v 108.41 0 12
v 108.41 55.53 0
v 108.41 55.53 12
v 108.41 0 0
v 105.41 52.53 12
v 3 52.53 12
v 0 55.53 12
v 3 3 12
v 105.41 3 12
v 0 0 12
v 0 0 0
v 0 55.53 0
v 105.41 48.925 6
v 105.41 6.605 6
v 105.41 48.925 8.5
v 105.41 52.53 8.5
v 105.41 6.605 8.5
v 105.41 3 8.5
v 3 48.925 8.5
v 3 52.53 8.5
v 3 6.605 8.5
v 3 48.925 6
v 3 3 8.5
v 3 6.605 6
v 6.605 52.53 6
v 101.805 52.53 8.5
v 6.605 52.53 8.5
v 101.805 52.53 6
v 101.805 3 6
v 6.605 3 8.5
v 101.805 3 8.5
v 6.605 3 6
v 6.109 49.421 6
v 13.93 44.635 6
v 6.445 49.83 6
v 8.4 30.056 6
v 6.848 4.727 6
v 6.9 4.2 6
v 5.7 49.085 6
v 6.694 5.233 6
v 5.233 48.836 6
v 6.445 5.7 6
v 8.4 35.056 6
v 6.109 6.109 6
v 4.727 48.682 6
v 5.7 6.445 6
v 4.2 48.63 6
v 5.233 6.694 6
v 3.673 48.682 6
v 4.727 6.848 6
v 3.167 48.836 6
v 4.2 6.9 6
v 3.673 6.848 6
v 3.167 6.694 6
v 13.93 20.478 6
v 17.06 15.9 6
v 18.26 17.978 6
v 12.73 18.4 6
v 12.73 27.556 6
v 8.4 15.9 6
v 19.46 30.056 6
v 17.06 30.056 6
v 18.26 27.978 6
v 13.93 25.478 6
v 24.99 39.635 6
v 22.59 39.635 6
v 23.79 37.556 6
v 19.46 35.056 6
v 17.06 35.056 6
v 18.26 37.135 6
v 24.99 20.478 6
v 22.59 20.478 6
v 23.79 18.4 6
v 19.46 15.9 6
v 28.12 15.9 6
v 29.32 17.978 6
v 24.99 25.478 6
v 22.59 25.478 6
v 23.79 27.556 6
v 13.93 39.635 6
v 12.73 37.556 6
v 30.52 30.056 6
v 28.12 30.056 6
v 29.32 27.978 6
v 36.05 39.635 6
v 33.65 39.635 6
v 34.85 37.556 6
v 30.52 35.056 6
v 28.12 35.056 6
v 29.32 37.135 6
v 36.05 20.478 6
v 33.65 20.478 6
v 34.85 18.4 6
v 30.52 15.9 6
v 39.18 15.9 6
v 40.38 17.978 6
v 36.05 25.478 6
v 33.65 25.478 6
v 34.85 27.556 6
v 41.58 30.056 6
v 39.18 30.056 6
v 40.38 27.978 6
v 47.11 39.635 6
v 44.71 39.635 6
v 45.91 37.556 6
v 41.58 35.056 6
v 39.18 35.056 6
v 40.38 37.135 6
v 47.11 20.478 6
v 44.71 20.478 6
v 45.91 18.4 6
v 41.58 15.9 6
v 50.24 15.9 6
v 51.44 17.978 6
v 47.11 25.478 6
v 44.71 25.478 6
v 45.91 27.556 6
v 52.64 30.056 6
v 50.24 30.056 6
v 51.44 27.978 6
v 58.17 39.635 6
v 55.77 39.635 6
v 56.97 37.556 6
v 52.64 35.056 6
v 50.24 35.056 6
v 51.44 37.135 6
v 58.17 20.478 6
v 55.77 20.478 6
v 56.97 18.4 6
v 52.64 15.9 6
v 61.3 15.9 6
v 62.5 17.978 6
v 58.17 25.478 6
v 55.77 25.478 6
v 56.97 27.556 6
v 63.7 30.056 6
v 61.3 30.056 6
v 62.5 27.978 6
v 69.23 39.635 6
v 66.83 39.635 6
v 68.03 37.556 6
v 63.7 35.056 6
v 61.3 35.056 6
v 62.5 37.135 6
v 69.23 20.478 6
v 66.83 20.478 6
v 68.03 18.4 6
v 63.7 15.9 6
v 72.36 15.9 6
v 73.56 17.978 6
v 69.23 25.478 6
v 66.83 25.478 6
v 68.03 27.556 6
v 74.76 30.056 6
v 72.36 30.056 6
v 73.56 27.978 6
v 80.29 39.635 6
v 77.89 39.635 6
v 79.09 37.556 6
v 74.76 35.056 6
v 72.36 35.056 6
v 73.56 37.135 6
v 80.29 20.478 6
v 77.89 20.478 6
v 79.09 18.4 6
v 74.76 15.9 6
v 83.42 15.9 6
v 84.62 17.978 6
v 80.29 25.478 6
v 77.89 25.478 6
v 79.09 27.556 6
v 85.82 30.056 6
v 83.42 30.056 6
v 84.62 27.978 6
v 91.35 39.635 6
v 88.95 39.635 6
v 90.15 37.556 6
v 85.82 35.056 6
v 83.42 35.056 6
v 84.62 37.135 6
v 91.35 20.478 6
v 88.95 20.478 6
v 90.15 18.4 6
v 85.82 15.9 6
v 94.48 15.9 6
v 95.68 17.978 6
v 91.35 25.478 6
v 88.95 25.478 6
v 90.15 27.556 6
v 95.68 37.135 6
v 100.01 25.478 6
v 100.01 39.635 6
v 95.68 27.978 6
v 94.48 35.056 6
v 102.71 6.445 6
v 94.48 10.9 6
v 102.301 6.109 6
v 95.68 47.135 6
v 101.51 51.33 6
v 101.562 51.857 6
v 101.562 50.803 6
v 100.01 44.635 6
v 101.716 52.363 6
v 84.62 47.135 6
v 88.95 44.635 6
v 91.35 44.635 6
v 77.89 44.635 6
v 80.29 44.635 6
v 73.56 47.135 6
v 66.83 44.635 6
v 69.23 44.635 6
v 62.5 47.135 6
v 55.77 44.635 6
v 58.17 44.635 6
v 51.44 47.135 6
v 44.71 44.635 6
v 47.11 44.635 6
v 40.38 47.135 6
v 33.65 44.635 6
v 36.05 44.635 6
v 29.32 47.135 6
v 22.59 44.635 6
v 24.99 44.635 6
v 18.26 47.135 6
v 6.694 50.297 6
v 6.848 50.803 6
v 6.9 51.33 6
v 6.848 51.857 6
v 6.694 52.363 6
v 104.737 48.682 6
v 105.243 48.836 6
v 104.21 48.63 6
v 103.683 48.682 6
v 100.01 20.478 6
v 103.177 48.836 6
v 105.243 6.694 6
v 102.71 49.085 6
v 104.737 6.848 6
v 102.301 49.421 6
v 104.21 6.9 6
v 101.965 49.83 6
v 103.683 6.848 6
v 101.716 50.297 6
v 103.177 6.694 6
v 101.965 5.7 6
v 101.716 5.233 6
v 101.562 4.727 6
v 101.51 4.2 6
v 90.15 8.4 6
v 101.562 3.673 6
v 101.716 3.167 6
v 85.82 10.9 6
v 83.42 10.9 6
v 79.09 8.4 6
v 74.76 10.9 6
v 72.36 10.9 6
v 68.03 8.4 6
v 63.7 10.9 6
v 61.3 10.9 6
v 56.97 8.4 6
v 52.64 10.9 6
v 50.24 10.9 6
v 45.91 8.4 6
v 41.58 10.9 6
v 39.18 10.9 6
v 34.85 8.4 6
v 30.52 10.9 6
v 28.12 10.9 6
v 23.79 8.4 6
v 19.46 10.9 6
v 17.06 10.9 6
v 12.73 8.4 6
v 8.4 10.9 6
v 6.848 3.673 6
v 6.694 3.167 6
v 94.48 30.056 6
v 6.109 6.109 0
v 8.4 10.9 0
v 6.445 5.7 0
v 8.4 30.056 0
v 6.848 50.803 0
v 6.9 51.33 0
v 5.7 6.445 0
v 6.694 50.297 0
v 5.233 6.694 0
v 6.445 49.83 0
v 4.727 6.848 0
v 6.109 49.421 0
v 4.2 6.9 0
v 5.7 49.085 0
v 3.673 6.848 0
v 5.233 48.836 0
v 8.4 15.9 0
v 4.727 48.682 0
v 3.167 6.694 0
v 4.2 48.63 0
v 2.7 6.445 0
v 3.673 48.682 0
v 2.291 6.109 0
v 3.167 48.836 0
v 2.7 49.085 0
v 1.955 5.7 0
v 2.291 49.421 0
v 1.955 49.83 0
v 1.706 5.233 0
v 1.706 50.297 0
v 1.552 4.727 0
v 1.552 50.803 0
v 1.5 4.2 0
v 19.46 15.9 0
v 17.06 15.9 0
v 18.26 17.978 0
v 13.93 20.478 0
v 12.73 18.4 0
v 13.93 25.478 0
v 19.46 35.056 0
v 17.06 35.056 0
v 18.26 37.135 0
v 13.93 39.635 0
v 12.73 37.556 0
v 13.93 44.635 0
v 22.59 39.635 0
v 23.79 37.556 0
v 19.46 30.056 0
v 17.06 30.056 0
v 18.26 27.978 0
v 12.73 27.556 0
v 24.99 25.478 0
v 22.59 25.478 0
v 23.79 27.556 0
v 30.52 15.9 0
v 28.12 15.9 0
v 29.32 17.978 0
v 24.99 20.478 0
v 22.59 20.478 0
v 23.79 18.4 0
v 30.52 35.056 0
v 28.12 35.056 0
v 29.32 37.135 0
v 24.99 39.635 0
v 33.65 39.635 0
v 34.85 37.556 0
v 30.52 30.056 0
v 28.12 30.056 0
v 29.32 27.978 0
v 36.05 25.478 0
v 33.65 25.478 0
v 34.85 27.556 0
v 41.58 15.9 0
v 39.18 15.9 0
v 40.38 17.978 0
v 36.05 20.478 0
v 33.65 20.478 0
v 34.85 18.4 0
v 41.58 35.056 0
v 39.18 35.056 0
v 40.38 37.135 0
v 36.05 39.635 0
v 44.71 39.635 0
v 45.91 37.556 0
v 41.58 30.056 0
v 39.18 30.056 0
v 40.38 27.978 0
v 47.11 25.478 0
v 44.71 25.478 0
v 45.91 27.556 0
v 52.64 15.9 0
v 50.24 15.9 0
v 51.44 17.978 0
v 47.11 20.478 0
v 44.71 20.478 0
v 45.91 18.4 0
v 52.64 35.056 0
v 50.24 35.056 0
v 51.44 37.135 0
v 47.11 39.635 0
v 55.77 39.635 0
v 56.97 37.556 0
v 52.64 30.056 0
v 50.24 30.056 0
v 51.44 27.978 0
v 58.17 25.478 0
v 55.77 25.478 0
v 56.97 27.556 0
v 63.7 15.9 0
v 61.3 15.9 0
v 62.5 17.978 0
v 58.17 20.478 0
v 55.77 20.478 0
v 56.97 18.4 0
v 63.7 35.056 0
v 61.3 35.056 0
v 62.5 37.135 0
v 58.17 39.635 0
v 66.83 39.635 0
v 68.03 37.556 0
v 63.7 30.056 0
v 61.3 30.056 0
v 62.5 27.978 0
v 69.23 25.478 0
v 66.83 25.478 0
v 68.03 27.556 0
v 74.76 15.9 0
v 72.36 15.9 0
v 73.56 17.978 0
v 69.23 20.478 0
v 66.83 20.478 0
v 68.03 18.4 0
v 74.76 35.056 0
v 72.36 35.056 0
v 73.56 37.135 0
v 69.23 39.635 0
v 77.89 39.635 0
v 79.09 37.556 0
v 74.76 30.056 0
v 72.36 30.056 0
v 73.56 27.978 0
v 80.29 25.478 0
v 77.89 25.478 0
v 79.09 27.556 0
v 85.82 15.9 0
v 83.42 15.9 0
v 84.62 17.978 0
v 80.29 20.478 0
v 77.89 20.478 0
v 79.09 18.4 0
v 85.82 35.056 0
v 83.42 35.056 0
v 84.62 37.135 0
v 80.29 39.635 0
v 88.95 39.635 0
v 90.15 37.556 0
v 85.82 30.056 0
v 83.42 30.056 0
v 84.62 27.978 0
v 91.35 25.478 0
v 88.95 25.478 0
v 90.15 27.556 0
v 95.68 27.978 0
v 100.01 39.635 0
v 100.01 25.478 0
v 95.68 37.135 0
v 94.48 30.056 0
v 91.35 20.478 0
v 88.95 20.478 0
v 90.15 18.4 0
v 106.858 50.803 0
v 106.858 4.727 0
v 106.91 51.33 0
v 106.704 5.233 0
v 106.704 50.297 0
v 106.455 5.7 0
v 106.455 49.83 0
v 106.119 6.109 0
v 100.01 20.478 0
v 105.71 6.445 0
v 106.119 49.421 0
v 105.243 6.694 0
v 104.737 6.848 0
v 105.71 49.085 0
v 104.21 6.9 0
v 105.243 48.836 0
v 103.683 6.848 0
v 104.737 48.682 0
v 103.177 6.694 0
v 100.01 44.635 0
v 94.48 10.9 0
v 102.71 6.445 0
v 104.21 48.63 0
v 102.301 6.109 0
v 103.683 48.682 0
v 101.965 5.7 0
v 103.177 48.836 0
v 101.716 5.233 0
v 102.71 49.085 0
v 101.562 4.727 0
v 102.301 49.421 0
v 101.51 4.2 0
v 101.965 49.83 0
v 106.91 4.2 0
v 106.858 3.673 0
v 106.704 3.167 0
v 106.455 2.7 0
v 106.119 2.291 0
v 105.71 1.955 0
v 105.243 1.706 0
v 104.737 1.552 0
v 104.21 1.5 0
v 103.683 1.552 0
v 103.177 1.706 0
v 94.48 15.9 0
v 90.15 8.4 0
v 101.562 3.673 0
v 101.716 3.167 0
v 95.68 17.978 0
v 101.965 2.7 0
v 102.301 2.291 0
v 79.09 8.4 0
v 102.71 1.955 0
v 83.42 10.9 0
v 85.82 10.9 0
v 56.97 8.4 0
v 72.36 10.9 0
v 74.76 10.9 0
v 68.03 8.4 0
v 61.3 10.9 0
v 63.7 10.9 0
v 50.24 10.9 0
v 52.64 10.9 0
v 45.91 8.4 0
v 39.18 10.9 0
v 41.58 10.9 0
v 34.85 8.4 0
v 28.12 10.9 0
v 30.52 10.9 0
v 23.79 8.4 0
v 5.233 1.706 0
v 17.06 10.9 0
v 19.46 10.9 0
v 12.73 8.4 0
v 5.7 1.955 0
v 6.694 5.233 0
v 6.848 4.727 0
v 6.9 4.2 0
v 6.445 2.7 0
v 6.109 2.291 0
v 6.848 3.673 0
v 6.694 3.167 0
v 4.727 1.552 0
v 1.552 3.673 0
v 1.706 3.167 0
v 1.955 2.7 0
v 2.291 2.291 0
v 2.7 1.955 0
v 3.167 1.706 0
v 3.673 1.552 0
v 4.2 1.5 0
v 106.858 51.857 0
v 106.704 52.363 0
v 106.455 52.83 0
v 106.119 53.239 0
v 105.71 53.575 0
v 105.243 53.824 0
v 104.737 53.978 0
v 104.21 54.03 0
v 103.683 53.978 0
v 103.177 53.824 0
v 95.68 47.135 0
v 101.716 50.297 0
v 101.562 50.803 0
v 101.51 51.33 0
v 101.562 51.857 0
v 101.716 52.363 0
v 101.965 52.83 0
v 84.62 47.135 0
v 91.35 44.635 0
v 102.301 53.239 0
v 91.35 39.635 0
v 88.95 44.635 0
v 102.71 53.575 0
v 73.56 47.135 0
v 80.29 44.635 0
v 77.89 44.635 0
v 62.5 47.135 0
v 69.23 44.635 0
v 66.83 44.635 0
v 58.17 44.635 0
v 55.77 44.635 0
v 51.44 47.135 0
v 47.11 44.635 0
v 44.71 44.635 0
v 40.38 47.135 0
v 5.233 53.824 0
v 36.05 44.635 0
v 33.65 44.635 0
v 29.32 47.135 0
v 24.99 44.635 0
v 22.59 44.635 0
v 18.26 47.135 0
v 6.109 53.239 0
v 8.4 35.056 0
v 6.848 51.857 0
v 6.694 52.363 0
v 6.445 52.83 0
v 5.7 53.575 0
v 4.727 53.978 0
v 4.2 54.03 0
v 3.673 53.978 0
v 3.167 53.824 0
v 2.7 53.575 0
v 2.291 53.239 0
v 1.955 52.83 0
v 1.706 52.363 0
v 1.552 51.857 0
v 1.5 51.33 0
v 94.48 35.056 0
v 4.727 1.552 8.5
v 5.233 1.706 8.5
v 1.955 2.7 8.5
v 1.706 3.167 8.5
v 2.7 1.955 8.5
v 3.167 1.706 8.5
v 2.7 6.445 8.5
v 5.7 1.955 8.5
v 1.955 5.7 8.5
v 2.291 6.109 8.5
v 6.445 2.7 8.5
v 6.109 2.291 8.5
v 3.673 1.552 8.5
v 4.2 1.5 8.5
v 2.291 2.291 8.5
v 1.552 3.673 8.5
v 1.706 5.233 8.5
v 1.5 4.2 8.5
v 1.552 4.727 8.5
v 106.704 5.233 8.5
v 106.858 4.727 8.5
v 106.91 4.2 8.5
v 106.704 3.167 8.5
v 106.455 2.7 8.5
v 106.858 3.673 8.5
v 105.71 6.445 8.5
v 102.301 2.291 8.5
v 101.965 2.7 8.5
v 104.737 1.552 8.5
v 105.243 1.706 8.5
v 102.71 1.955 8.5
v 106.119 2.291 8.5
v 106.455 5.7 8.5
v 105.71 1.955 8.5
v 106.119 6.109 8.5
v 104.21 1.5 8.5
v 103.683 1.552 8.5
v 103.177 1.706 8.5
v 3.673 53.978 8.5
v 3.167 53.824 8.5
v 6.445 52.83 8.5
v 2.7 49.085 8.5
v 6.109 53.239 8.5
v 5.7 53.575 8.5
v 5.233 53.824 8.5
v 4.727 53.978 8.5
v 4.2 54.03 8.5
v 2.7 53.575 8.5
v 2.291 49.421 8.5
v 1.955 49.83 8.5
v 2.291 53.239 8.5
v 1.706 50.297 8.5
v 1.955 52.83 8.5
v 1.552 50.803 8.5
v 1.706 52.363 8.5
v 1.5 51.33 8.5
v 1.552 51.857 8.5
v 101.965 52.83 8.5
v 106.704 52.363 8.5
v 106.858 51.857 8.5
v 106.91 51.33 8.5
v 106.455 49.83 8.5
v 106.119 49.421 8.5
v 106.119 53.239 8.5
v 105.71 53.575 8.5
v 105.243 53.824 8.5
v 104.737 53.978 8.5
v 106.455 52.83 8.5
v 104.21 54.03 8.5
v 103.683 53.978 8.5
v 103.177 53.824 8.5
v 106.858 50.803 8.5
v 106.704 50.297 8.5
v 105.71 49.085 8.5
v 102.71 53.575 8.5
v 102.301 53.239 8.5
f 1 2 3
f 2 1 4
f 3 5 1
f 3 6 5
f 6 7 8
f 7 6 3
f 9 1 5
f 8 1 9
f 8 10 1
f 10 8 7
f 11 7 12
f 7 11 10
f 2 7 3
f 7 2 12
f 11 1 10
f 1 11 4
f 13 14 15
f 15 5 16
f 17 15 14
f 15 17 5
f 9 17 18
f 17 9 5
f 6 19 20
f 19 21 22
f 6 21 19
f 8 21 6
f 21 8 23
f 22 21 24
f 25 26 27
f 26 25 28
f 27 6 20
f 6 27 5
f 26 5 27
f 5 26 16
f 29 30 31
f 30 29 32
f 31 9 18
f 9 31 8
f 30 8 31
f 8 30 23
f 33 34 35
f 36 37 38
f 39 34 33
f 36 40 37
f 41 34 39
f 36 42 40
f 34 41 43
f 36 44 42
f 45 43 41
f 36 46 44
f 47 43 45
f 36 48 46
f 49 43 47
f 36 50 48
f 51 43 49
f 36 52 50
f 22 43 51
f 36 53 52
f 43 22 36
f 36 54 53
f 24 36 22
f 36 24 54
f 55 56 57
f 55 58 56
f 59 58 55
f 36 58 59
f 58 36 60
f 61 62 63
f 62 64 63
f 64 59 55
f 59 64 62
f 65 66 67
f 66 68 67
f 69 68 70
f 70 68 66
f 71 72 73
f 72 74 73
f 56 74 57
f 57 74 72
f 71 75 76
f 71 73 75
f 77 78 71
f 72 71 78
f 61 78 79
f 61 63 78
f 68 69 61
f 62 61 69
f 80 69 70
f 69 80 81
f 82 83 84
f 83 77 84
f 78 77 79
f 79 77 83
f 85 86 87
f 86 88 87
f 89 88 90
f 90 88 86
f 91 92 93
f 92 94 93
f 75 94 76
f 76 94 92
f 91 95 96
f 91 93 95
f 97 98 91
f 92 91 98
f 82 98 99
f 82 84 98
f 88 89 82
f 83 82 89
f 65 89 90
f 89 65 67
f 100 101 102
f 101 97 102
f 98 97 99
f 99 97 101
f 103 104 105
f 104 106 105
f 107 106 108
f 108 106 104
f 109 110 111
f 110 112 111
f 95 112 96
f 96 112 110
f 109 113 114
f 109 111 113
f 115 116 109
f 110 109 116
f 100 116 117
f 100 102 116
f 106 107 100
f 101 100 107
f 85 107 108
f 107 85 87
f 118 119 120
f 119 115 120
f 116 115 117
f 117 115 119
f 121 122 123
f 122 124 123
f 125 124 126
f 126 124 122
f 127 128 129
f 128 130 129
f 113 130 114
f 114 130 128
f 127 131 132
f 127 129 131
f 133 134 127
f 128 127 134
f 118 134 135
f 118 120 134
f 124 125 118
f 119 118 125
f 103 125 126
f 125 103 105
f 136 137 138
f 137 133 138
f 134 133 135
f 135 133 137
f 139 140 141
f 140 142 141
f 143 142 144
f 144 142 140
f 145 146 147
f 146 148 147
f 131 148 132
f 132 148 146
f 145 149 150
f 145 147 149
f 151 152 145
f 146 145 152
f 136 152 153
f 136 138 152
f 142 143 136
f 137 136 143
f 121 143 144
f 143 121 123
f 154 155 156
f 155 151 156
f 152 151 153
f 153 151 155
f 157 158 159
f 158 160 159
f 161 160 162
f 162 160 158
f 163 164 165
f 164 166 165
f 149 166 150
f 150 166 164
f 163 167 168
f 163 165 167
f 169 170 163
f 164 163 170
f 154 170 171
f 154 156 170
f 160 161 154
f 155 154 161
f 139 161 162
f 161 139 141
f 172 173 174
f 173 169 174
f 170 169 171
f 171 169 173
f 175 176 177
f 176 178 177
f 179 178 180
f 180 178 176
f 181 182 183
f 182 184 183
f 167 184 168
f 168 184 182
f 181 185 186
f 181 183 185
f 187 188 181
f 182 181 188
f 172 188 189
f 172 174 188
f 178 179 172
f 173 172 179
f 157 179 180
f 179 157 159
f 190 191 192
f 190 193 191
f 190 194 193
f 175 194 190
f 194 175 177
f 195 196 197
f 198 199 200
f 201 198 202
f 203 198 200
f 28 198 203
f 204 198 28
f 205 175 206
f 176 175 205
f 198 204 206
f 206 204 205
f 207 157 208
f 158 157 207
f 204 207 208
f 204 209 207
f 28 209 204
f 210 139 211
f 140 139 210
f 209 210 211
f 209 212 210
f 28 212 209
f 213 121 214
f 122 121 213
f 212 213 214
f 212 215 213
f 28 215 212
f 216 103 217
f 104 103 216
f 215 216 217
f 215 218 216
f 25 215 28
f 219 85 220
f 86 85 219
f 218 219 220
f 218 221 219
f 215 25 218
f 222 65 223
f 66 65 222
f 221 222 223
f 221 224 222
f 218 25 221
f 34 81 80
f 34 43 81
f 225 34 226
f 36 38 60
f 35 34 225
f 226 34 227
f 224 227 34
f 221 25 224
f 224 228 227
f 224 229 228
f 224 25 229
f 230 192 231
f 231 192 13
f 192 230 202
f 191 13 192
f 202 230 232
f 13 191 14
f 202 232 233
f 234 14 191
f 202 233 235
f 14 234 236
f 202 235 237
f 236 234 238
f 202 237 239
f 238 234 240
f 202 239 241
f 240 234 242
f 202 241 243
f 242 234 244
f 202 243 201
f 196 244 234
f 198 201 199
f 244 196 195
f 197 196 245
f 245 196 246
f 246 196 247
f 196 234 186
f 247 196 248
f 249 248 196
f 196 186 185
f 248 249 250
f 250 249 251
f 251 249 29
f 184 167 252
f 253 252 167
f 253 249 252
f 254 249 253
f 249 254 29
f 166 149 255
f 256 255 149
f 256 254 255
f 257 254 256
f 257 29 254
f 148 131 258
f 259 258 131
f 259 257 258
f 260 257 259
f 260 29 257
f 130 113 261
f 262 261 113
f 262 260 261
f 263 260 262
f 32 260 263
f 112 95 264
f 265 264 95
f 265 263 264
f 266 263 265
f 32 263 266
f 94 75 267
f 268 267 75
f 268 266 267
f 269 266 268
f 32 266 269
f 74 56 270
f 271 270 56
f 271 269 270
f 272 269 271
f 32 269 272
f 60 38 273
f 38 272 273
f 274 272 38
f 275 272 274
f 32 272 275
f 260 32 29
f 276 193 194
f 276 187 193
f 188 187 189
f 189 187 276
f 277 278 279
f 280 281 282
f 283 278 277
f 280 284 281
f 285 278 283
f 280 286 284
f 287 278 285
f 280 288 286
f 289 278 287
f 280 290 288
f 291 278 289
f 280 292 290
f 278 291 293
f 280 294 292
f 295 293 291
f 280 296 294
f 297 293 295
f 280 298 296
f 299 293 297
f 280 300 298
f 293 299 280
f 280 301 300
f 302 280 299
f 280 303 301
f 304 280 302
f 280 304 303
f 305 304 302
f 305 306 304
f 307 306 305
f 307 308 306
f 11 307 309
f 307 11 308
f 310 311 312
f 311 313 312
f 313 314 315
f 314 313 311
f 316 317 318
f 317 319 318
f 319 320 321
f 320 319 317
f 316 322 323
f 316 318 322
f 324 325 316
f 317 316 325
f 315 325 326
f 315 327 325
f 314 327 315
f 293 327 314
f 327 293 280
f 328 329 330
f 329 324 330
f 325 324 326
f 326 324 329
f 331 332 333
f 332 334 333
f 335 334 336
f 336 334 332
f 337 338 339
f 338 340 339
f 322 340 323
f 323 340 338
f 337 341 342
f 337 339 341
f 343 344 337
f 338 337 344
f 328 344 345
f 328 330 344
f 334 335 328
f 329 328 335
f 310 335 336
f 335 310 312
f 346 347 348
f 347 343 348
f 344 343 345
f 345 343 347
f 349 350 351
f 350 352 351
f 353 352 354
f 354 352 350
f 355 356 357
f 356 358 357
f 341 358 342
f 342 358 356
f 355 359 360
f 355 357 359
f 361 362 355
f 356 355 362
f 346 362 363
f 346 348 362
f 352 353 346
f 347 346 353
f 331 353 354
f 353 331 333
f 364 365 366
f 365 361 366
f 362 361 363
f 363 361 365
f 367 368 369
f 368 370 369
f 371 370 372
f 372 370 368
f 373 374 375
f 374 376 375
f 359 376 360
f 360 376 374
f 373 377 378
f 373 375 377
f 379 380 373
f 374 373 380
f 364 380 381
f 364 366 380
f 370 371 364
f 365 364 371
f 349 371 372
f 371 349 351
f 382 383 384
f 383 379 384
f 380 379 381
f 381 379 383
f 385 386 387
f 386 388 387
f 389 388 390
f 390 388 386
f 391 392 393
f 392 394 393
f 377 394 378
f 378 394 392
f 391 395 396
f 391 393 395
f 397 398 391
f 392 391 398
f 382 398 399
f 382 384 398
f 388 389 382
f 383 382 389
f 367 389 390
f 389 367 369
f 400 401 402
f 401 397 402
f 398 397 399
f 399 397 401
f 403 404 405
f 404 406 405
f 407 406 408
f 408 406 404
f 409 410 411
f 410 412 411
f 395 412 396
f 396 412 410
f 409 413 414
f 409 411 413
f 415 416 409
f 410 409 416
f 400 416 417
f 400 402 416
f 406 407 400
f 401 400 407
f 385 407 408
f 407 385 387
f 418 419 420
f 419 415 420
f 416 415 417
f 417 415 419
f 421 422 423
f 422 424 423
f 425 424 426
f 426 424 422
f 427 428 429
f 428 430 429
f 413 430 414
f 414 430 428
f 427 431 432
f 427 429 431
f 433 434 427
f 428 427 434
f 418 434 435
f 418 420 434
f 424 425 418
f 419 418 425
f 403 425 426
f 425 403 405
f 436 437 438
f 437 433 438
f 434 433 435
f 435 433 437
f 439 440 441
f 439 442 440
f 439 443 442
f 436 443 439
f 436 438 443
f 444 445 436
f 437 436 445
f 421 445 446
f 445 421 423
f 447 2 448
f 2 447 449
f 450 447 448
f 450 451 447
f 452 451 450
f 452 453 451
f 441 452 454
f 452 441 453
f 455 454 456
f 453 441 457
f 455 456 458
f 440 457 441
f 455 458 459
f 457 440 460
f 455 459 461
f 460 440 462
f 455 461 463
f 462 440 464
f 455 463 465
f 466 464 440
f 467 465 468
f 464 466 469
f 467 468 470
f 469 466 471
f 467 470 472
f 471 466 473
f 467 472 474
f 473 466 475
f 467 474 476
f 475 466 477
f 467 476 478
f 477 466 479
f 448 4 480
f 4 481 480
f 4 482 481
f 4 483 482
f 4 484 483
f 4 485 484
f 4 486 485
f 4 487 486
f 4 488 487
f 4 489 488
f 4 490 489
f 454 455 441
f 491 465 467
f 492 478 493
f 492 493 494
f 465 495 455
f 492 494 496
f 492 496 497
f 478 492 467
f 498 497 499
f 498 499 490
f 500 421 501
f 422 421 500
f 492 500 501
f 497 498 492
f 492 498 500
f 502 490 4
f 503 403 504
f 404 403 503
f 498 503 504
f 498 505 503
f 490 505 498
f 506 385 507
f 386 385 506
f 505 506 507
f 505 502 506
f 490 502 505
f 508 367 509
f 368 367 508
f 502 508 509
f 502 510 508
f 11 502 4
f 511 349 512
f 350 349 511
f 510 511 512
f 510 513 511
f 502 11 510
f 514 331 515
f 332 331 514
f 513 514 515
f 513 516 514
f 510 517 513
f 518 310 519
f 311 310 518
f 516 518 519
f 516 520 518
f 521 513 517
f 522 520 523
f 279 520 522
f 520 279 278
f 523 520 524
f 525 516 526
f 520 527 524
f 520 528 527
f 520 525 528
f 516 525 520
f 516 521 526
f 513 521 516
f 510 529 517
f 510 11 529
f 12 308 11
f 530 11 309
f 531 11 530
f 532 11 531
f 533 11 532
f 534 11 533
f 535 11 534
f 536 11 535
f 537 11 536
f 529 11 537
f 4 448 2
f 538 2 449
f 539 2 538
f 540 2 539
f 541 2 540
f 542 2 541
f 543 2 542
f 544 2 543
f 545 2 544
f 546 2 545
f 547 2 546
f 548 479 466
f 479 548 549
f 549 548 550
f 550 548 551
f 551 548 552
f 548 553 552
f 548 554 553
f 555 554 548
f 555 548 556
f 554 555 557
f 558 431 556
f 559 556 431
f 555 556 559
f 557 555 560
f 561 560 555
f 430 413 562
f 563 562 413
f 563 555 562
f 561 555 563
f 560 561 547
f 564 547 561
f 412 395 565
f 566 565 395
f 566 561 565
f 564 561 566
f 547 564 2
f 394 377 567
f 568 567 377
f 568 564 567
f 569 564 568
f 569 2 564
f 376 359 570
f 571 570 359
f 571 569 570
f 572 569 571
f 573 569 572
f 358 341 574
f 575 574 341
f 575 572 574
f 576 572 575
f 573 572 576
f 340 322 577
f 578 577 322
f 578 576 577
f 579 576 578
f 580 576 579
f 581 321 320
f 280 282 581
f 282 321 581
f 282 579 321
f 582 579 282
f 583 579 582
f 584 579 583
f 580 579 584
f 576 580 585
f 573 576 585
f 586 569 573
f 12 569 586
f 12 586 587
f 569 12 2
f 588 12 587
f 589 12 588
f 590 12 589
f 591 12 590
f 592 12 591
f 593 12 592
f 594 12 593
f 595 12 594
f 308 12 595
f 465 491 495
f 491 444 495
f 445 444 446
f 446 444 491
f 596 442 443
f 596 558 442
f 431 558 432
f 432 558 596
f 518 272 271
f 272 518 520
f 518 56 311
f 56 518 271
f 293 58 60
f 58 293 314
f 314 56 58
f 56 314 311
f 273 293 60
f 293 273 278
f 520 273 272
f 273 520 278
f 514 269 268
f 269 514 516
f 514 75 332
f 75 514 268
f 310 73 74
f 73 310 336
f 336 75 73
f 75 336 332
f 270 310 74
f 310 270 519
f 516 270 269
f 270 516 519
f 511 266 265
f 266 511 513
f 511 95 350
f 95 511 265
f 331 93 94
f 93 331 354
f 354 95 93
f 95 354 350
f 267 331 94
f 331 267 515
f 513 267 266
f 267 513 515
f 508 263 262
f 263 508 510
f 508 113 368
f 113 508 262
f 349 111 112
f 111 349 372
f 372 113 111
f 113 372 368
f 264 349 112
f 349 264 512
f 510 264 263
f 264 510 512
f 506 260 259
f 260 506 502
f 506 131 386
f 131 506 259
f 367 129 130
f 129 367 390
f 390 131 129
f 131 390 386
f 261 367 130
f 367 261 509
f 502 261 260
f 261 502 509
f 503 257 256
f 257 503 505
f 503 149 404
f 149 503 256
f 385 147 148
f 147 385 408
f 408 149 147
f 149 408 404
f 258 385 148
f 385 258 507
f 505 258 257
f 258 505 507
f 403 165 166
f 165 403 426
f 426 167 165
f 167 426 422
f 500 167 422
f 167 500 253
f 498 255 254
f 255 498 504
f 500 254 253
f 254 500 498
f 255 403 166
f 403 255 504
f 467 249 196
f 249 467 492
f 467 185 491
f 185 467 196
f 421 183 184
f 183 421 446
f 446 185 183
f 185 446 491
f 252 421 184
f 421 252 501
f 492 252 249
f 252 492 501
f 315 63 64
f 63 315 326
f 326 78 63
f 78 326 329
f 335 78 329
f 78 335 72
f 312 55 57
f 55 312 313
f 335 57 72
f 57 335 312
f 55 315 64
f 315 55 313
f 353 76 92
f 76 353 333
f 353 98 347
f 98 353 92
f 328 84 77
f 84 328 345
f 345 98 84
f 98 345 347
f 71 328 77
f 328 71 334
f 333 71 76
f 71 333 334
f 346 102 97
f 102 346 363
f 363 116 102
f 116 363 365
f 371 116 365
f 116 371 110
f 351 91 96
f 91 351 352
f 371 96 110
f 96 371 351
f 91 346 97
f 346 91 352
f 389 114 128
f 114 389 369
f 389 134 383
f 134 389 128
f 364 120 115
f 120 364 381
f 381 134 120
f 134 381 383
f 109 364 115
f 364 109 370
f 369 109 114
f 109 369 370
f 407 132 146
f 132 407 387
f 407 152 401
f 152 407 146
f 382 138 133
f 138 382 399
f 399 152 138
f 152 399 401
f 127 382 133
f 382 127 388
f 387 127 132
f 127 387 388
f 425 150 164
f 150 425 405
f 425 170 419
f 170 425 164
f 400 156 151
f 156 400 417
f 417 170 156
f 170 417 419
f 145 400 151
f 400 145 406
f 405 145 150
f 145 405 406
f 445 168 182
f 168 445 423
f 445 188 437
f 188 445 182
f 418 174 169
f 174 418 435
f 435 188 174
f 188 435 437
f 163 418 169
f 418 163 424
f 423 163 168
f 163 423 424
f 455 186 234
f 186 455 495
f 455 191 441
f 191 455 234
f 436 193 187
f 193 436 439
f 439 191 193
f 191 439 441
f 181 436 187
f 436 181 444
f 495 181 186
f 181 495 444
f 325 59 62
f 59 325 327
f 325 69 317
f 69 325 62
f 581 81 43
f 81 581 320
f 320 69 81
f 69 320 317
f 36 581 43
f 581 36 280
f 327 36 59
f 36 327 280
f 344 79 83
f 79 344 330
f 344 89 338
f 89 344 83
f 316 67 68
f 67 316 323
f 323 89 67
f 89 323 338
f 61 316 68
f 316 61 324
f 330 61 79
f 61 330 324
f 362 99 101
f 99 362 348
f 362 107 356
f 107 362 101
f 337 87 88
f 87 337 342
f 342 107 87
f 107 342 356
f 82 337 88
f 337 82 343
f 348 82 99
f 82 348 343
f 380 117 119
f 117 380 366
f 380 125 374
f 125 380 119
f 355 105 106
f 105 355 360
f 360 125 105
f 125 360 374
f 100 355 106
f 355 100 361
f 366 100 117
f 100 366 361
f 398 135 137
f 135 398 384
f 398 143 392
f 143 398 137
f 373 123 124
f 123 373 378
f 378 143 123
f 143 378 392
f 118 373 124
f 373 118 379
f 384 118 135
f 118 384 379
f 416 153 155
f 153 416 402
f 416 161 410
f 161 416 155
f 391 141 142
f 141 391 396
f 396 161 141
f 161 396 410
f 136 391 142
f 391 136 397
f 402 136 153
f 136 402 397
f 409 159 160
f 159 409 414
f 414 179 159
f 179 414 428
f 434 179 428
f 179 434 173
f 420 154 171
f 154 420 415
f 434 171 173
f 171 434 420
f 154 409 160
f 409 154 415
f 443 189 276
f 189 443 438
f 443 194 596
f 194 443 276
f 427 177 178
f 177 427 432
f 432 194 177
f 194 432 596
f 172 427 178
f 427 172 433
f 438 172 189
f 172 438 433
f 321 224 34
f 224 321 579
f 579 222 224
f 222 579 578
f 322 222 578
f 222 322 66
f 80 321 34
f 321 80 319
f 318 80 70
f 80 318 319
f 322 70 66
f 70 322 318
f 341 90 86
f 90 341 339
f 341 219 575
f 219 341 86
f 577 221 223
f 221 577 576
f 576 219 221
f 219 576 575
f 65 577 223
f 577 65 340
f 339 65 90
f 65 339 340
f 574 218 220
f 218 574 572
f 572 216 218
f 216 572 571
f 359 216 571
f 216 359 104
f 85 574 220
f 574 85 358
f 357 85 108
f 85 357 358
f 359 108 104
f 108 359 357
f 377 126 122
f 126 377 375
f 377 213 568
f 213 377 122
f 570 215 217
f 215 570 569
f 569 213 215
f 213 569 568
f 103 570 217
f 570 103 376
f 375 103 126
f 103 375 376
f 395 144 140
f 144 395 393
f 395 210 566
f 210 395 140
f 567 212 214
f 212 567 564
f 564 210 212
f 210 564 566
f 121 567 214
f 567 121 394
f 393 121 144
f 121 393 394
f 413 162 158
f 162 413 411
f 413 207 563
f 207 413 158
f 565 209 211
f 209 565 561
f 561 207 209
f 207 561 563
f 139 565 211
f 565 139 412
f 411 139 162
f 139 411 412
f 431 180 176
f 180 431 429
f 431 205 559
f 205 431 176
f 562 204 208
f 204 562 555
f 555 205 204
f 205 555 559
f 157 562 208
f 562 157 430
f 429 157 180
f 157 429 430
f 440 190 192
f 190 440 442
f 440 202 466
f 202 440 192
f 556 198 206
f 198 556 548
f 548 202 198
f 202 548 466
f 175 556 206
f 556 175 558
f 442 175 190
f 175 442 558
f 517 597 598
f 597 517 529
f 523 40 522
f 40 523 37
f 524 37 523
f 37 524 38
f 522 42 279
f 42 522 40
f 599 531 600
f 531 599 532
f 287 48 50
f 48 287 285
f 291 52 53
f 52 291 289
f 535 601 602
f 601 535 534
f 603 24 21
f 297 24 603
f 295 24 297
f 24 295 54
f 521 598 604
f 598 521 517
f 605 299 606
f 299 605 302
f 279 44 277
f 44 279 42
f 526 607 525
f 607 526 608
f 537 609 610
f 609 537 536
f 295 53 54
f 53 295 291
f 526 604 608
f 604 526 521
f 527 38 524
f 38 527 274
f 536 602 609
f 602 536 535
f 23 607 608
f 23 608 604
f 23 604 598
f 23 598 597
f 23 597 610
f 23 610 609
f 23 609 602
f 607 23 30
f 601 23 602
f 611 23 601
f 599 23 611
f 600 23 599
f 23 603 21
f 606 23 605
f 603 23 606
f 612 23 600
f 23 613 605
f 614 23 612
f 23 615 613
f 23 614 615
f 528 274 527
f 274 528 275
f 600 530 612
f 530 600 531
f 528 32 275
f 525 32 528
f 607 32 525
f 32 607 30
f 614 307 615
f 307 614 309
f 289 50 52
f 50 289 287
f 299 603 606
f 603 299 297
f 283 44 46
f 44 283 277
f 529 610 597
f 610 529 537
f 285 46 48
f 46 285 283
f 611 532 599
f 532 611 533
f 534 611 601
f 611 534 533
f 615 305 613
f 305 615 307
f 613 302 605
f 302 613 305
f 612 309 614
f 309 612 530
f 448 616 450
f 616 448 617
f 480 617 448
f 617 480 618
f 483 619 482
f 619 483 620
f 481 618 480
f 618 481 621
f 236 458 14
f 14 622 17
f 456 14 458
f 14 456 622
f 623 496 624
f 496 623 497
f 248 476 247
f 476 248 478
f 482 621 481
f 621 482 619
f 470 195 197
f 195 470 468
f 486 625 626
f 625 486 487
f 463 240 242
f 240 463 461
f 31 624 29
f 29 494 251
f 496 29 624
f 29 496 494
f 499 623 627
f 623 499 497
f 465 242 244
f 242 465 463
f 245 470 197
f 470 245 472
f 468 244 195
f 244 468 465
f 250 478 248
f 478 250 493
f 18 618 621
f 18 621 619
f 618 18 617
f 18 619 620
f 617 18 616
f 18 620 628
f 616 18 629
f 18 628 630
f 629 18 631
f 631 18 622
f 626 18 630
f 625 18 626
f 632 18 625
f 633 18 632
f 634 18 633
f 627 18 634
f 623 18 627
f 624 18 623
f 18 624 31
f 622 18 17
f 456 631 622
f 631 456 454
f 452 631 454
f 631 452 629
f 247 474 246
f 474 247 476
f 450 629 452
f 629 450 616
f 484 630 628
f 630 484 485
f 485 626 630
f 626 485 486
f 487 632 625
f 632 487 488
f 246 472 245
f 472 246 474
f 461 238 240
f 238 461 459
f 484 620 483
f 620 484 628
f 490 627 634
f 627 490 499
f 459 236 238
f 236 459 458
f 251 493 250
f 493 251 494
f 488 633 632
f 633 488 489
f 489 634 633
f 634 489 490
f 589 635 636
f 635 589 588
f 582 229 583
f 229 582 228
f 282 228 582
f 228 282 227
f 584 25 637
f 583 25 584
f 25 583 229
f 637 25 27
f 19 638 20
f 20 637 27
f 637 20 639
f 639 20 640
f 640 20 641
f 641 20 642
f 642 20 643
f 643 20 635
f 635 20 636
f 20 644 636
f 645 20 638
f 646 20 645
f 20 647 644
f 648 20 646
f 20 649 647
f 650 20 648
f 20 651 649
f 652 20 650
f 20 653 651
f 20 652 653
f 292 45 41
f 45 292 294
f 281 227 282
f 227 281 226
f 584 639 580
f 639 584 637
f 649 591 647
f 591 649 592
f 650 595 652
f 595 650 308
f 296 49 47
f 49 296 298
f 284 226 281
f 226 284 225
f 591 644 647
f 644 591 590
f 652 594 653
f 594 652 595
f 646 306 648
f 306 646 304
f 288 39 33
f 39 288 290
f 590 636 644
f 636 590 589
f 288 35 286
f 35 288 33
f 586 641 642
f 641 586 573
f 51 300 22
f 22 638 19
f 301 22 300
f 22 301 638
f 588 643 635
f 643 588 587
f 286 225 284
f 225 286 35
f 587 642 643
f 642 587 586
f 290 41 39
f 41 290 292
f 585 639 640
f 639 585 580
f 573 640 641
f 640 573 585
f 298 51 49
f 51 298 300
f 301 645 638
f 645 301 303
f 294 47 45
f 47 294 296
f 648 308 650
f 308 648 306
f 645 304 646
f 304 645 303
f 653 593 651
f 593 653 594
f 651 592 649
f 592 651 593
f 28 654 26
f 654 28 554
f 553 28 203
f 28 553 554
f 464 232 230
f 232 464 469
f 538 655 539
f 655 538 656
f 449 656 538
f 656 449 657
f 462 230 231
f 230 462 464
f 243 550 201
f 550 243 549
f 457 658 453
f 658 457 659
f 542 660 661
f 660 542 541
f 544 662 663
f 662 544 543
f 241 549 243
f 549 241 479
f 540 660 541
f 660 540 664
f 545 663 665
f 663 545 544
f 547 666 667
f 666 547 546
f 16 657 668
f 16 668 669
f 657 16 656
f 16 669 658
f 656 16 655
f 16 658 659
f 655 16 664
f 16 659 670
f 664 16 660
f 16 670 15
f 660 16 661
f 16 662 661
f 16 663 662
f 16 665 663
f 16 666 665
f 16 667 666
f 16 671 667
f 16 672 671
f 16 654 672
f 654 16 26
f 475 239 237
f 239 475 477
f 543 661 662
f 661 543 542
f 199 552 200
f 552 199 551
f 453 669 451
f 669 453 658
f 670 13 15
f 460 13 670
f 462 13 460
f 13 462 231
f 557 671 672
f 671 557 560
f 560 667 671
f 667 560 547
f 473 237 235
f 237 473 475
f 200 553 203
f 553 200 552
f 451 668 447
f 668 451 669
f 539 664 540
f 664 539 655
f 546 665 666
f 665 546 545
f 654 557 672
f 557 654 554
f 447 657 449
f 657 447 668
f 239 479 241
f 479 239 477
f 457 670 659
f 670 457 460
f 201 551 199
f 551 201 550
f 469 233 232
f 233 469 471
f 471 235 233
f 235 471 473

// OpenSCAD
$fn = 32;

// ----------------------------------------------------------------------
// Honeycomb panel: 108.41 x 55.53 mm, 32 cells of 10 mm
// ----------------------------------------------------------------------

// --- parameters (mm) ---
panel_w = 108.41;         // panel width
panel_d = 55.53;          // panel depth
thick = 6;                // panel thickness
cell_r = 5;               // hex cell circumradius
pitch = 11.06;            // hex cell pitch (centre to centre)
web = 2.4;                // web between the cells
columns = 8;              // columns of cells
rows = 4;                 // rows of cells
cell_count = 32;          // total cells
shift_x = 12.73;          // first cell offset in x
shift_y = 13.4;           // first cell offset in y
mount_d = 5.4;            // corner mounting holes
hole_off = 4.2;           // mounting hole offset from the corners
rim_h = 12;               // rim height
rim_t = 3;                // rim wall thickness

difference() {
  union() {
    cube([panel_w, panel_d, thick]);
    /* rim around the panel, sunk 1 mm into the plate */
    translate([0, 0, thick - 1]) difference() {
      cube([panel_w, panel_d, rim_h - thick + 1]);
      translate([rim_t, rim_t, -2.5]) cube([panel_w - 2 * rim_t, panel_d - 2 * rim_t, rim_h - thick + 6]);
    }
  }
  /* hexagonal cells, point-up, cut right through the plate */
  for (row = [0 : rows - 1]) {
    for (col = [0 : columns - 1]) {
      translate([shift_x + col * pitch + (row % 2) * pitch / 2, shift_y + row * pitch * 0.866025, -2.5]) rotate([0, 0, 30]) cylinder(h = thick + 5, d = 2 * cell_r, $fn = 6);
    }
  }
  /* corner mounting holes, clear of the outer cell web */
  translate([4.2, 4.2, -2.5]) cylinder(h = thick + 5, d = mount_d);
  translate([104.21, 4.2, -2.5]) cylinder(h = thick + 5, d = mount_d);
  translate([4.2, 51.33, -2.5]) cylinder(h = thick + 5, d = mount_d);
  translate([104.21, 51.33, -2.5]) cylinder(h = thick + 5, d = mount_d);
}
